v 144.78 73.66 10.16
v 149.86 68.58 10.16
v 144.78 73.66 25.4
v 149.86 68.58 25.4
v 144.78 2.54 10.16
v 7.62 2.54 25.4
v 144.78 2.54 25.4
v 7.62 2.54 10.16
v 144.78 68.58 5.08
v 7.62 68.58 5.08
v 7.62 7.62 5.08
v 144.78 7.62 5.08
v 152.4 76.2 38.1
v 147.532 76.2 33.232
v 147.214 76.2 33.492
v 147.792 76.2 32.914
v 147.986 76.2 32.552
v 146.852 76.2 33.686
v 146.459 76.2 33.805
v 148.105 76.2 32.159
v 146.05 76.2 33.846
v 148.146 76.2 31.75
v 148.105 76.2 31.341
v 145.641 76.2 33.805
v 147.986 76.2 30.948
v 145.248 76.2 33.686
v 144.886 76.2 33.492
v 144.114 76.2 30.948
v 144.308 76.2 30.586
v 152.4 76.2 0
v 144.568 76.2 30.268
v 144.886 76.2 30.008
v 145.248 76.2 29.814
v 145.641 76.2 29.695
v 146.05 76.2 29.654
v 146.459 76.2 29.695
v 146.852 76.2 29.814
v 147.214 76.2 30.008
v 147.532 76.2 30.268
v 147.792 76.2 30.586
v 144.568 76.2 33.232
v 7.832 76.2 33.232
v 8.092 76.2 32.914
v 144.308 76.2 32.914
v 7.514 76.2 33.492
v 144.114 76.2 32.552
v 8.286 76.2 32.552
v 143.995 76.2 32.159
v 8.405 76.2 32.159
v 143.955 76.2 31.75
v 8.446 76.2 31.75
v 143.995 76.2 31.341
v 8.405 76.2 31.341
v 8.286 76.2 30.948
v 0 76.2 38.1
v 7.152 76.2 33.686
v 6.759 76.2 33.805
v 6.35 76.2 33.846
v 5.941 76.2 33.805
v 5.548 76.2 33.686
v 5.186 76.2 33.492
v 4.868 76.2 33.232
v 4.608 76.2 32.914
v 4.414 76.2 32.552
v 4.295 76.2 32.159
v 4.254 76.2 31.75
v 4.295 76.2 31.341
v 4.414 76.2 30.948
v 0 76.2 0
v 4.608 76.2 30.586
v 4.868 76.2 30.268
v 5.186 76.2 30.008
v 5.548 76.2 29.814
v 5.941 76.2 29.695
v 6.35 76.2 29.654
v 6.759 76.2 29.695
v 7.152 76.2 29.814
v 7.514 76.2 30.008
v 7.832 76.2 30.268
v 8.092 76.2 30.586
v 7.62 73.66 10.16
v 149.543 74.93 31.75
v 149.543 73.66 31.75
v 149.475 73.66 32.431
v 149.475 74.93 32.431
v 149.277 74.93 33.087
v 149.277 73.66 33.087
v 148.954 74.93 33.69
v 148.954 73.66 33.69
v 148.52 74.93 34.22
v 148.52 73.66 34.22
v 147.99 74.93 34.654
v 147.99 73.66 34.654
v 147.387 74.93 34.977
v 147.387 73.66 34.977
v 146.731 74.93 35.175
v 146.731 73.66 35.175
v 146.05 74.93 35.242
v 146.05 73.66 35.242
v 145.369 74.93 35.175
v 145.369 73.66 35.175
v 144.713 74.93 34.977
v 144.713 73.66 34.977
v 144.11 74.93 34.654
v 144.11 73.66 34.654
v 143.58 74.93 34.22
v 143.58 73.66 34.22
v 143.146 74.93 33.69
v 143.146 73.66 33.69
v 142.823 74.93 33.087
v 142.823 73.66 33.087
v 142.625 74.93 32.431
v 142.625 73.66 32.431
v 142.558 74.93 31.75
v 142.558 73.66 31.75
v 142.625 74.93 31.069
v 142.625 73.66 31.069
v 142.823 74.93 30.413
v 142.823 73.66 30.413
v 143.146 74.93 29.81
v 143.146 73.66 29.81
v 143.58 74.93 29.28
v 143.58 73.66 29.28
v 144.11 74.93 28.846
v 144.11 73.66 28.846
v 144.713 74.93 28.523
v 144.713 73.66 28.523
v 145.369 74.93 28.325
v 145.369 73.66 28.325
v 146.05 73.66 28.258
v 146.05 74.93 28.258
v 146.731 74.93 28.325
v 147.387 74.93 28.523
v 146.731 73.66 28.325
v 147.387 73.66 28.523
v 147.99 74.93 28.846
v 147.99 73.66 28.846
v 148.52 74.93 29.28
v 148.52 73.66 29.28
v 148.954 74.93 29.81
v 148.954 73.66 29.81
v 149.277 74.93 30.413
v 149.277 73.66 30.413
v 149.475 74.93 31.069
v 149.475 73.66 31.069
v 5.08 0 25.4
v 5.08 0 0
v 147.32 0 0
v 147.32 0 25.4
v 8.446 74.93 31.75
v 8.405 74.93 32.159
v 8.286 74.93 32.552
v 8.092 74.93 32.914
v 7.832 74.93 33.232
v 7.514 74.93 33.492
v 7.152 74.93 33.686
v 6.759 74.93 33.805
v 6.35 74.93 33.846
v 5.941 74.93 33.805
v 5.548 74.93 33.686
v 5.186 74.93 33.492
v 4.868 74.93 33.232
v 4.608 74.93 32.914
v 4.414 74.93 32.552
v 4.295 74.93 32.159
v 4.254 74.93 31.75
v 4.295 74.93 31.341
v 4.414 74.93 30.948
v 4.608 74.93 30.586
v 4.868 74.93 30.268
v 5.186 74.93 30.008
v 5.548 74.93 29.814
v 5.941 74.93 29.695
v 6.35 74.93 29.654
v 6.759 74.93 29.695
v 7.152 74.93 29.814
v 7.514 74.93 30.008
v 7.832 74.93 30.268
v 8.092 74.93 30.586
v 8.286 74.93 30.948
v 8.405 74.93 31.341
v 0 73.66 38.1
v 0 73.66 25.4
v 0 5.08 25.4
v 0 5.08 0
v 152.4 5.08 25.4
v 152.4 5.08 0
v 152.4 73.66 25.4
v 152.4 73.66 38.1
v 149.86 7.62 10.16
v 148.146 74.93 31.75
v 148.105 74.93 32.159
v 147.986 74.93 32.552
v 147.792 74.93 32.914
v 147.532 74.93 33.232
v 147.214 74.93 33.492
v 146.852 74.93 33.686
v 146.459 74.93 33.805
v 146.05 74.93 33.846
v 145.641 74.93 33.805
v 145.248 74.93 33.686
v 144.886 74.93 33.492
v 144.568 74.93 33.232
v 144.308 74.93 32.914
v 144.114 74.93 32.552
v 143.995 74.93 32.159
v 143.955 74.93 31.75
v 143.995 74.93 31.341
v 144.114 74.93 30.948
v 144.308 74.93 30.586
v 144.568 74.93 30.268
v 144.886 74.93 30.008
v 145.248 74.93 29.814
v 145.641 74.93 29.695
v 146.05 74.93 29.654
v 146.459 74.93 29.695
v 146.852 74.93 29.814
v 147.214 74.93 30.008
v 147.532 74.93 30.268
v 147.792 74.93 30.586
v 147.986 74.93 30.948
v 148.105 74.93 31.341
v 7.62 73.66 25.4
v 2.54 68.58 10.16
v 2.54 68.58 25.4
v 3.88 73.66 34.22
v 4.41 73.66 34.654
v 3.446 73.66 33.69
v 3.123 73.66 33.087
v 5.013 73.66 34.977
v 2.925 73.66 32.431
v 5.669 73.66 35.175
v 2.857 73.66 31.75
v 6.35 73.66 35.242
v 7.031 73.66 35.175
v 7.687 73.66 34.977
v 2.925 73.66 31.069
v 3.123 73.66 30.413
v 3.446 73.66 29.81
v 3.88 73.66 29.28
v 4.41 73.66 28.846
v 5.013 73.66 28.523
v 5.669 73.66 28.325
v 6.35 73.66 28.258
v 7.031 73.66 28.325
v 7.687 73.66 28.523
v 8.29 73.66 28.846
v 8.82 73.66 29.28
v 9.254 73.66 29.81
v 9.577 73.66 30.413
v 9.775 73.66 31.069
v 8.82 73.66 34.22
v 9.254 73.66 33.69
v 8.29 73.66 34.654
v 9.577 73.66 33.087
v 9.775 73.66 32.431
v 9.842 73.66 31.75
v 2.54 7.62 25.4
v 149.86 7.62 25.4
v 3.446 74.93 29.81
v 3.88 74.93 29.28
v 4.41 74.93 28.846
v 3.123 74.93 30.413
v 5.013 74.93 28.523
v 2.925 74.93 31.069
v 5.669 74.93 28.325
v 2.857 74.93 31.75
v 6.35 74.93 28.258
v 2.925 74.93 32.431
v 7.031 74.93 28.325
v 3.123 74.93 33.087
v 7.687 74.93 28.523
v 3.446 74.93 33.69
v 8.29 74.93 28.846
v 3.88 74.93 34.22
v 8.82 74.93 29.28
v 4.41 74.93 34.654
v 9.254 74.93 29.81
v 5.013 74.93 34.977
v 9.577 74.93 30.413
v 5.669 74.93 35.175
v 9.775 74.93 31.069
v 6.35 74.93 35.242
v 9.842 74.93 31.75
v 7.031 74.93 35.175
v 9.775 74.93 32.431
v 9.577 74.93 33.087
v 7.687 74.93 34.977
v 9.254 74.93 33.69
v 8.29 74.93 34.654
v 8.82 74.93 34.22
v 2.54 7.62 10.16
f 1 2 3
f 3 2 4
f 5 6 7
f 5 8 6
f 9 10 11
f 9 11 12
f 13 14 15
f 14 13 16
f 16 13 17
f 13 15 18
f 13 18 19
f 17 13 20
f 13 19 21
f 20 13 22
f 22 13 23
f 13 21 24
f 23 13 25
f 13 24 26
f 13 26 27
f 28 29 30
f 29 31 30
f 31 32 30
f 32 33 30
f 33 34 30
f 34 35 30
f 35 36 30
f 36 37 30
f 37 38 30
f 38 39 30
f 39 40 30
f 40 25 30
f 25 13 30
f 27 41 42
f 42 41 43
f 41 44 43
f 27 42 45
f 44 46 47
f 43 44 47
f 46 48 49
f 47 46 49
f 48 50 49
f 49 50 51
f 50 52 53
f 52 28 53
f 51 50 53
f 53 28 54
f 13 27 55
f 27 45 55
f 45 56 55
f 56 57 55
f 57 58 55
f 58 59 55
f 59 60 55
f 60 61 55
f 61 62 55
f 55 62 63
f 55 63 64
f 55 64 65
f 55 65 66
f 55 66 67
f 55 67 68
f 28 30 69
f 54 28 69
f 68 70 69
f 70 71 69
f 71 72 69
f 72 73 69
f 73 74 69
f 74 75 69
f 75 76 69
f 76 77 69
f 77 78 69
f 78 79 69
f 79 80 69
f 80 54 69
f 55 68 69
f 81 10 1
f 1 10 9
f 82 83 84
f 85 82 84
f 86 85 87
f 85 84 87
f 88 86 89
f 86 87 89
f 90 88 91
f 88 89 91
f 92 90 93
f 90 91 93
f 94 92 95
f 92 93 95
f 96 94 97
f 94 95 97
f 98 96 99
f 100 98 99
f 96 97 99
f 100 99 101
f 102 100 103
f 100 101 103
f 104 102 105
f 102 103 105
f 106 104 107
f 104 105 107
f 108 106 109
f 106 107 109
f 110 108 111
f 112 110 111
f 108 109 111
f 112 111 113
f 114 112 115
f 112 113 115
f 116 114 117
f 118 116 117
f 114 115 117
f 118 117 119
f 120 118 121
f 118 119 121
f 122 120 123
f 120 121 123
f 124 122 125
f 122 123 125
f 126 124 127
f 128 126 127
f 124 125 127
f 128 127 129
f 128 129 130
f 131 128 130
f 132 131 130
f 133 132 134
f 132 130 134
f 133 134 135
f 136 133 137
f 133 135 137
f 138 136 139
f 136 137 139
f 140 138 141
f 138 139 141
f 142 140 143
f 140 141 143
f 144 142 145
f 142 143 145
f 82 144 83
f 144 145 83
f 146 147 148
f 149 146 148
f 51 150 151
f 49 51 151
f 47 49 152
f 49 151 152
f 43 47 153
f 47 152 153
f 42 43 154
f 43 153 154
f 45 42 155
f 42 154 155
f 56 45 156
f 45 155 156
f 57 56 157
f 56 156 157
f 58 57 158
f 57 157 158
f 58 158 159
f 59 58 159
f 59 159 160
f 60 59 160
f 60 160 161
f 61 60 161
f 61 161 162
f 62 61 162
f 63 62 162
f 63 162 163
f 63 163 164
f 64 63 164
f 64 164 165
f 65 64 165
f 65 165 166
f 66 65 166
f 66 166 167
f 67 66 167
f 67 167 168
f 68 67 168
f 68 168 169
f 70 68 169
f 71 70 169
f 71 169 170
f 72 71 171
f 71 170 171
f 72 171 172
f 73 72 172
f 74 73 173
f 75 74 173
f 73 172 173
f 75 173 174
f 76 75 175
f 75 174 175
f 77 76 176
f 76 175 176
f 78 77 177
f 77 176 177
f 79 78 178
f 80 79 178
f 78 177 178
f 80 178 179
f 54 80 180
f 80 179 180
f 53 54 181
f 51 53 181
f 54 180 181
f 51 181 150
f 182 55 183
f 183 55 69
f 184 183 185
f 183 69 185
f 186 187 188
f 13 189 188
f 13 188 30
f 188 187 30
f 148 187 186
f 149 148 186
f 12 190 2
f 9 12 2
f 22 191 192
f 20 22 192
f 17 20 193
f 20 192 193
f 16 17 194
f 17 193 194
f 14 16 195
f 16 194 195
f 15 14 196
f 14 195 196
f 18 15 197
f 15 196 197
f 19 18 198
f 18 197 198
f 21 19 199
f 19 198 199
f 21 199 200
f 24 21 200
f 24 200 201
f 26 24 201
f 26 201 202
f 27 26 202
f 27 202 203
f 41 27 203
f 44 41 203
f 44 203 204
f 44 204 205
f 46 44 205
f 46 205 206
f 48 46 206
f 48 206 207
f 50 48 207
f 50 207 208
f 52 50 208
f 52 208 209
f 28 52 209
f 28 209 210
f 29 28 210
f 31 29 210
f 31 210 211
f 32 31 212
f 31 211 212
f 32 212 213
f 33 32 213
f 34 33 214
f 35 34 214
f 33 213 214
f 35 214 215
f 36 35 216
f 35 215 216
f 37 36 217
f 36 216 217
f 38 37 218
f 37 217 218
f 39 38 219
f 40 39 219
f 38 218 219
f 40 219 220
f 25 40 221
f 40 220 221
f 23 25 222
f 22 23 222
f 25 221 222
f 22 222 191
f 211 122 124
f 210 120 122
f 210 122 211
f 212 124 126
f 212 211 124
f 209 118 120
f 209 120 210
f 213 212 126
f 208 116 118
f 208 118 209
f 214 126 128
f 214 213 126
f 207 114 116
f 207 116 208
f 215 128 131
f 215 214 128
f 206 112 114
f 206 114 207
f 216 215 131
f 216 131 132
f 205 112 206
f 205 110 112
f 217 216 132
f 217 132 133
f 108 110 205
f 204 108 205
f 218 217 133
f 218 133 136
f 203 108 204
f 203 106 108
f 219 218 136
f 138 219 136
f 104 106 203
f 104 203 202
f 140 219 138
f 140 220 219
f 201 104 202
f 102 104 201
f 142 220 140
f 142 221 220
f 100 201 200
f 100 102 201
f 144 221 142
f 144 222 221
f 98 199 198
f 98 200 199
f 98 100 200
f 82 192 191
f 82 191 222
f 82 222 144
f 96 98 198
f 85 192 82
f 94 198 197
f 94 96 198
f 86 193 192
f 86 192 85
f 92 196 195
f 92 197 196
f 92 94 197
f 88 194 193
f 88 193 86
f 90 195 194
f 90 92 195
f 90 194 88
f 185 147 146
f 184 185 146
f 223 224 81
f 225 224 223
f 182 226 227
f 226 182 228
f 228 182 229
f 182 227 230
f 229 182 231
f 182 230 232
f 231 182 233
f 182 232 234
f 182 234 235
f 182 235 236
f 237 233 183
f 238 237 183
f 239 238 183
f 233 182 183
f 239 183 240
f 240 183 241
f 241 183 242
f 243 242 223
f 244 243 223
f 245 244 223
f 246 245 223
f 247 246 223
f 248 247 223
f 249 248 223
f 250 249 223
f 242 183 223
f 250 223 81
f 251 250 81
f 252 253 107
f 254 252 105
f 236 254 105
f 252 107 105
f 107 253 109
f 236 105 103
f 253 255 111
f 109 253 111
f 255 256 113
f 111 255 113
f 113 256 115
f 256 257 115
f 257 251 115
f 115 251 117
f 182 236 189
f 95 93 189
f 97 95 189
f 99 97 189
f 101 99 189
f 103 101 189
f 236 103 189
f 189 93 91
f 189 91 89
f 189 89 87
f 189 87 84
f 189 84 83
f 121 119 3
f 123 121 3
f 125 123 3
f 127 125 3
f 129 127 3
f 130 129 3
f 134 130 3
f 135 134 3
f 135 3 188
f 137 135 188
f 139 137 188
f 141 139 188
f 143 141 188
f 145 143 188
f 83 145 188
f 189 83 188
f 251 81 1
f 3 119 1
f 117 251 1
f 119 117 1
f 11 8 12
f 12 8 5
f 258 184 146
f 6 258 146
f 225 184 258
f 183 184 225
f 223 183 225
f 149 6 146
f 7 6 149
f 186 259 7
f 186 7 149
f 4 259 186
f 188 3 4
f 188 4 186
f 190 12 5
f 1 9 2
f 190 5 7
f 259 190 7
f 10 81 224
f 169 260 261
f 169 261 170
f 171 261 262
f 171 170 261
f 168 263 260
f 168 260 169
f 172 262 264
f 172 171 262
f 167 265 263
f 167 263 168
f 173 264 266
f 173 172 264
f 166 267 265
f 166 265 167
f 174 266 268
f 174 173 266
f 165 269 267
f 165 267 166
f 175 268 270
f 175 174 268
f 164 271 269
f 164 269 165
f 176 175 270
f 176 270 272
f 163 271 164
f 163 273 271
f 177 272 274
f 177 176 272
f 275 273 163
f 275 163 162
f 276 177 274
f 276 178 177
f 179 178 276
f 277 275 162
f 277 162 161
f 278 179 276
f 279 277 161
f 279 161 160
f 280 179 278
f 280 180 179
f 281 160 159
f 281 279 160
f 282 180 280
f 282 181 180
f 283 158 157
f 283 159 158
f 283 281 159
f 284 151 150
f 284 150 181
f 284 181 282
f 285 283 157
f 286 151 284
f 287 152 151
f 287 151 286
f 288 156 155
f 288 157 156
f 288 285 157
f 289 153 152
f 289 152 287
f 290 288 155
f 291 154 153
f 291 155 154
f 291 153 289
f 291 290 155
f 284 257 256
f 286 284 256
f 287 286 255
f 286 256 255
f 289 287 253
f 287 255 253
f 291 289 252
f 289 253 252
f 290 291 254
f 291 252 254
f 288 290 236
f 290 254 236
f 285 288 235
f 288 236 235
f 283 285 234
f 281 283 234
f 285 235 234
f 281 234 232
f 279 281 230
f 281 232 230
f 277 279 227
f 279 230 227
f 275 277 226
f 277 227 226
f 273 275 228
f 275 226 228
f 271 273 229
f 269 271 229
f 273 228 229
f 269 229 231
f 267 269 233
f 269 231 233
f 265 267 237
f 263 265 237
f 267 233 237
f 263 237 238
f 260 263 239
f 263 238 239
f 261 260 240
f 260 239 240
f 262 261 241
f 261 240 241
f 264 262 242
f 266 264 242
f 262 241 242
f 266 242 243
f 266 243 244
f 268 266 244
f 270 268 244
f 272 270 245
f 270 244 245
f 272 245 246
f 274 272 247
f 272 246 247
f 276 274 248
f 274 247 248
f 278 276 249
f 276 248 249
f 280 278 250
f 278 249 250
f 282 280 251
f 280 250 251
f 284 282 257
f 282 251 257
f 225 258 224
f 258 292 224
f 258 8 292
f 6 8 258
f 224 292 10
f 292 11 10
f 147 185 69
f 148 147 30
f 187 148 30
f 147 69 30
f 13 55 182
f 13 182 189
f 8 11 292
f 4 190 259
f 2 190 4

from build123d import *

# Parameters (mm, degrees)
F0_W     = 152.4
F0_H     = 76.2
F0_W_2   = 147.32
F0_H_2   = 71.12
F1_DEPTH = 25.4
F2_DEPTH = 5.08
F4_DEPTH = 12.7
F5_R     = 3.4925
F5_R_2   = 2.0955
F6_DEPTH = 1.27
F7_DEPTH = 25.4
F8_SIZE  = 5.08


with BuildPart() as f1:
    # F0 (on Top) → F1 (new body)
    with BuildSketch(Plane.XY):
        with Locations((76.2, 38.1)):
            Rectangle(F0_W, F0_H)
        with Locations((76.2, 38.1)):
            Rectangle(F0_W_2, F0_H_2, mode=Mode.SUBTRACT)
    extrude(amount=F1_DEPTH)

    # F0 (on Top) → F2 (join)
    with BuildSketch(Plane.XY):
        with Locations((76.2, 38.1)):
            Rectangle(F0_W, F0_H)
        with Locations((76.2, 38.1)):
            Rectangle(F0_W_2, F0_H_2, mode=Mode.SUBTRACT)
        with Locations((76.2, 38.1)):
            Rectangle(F0_W_2, F0_H_2)
    extrude(amount=F2_DEPTH)

    # F3 (on face) → F4 (join)
    with BuildSketch(Plane.XY.offset(25.4)):
        Polygon((0, 76.2), (0, 73.66), (2.54, 73.66), (149.86, 73.66), (152.4, 73.66), (152.4, 76.2), align=None)
    extrude(amount=F4_DEPTH)

    # F5 (on face) → F6 (cut)
    with BuildSketch(Plane.XZ.offset(-73.66)):
        with Locations((6.35, 31.75)):
            Circle(F5_R)
        with Locations((6.35, 31.75)):
            Circle(F5_R_2, mode=Mode.SUBTRACT)
        with Locations((146.05, 31.75)):
            Circle(F5_R)
        with Locations((146.05, 31.75)):
            Circle(F5_R_2, mode=Mode.SUBTRACT)
    extrude(amount=-F6_DEPTH, mode=Mode.SUBTRACT)

    # F7 (cut): faces of the model
    f7_faces = [f1.faces().sort_by_distance(p)[0] for p in [
        (6.35, 73.66, 31.75),
        (146.05, 73.66, 31.75),
    ]]
    extrude(f7_faces, amount=-F7_DEPTH, mode=Mode.SUBTRACT)

    # F8
    f8_edges = [f1.edges().sort_by_distance(p)[0] for p in [
        (2.54, 73.66, 15.24),
        (76.2, 73.66, 5.08),
        (2.54, 38.1, 5.08),
        (76.2, 2.54, 5.08),
        (149.86, 38.1, 5.08),
        (2.54, 2.54, 15.24),
        (149.86, 2.54, 15.24),
        (149.86, 73.66, 15.24),
        (0, 0, 12.7),
        (152.4, 0, 12.7),
    ]]
    chamfer(f8_edges, length=F8_SIZE)


solid = f1.part
